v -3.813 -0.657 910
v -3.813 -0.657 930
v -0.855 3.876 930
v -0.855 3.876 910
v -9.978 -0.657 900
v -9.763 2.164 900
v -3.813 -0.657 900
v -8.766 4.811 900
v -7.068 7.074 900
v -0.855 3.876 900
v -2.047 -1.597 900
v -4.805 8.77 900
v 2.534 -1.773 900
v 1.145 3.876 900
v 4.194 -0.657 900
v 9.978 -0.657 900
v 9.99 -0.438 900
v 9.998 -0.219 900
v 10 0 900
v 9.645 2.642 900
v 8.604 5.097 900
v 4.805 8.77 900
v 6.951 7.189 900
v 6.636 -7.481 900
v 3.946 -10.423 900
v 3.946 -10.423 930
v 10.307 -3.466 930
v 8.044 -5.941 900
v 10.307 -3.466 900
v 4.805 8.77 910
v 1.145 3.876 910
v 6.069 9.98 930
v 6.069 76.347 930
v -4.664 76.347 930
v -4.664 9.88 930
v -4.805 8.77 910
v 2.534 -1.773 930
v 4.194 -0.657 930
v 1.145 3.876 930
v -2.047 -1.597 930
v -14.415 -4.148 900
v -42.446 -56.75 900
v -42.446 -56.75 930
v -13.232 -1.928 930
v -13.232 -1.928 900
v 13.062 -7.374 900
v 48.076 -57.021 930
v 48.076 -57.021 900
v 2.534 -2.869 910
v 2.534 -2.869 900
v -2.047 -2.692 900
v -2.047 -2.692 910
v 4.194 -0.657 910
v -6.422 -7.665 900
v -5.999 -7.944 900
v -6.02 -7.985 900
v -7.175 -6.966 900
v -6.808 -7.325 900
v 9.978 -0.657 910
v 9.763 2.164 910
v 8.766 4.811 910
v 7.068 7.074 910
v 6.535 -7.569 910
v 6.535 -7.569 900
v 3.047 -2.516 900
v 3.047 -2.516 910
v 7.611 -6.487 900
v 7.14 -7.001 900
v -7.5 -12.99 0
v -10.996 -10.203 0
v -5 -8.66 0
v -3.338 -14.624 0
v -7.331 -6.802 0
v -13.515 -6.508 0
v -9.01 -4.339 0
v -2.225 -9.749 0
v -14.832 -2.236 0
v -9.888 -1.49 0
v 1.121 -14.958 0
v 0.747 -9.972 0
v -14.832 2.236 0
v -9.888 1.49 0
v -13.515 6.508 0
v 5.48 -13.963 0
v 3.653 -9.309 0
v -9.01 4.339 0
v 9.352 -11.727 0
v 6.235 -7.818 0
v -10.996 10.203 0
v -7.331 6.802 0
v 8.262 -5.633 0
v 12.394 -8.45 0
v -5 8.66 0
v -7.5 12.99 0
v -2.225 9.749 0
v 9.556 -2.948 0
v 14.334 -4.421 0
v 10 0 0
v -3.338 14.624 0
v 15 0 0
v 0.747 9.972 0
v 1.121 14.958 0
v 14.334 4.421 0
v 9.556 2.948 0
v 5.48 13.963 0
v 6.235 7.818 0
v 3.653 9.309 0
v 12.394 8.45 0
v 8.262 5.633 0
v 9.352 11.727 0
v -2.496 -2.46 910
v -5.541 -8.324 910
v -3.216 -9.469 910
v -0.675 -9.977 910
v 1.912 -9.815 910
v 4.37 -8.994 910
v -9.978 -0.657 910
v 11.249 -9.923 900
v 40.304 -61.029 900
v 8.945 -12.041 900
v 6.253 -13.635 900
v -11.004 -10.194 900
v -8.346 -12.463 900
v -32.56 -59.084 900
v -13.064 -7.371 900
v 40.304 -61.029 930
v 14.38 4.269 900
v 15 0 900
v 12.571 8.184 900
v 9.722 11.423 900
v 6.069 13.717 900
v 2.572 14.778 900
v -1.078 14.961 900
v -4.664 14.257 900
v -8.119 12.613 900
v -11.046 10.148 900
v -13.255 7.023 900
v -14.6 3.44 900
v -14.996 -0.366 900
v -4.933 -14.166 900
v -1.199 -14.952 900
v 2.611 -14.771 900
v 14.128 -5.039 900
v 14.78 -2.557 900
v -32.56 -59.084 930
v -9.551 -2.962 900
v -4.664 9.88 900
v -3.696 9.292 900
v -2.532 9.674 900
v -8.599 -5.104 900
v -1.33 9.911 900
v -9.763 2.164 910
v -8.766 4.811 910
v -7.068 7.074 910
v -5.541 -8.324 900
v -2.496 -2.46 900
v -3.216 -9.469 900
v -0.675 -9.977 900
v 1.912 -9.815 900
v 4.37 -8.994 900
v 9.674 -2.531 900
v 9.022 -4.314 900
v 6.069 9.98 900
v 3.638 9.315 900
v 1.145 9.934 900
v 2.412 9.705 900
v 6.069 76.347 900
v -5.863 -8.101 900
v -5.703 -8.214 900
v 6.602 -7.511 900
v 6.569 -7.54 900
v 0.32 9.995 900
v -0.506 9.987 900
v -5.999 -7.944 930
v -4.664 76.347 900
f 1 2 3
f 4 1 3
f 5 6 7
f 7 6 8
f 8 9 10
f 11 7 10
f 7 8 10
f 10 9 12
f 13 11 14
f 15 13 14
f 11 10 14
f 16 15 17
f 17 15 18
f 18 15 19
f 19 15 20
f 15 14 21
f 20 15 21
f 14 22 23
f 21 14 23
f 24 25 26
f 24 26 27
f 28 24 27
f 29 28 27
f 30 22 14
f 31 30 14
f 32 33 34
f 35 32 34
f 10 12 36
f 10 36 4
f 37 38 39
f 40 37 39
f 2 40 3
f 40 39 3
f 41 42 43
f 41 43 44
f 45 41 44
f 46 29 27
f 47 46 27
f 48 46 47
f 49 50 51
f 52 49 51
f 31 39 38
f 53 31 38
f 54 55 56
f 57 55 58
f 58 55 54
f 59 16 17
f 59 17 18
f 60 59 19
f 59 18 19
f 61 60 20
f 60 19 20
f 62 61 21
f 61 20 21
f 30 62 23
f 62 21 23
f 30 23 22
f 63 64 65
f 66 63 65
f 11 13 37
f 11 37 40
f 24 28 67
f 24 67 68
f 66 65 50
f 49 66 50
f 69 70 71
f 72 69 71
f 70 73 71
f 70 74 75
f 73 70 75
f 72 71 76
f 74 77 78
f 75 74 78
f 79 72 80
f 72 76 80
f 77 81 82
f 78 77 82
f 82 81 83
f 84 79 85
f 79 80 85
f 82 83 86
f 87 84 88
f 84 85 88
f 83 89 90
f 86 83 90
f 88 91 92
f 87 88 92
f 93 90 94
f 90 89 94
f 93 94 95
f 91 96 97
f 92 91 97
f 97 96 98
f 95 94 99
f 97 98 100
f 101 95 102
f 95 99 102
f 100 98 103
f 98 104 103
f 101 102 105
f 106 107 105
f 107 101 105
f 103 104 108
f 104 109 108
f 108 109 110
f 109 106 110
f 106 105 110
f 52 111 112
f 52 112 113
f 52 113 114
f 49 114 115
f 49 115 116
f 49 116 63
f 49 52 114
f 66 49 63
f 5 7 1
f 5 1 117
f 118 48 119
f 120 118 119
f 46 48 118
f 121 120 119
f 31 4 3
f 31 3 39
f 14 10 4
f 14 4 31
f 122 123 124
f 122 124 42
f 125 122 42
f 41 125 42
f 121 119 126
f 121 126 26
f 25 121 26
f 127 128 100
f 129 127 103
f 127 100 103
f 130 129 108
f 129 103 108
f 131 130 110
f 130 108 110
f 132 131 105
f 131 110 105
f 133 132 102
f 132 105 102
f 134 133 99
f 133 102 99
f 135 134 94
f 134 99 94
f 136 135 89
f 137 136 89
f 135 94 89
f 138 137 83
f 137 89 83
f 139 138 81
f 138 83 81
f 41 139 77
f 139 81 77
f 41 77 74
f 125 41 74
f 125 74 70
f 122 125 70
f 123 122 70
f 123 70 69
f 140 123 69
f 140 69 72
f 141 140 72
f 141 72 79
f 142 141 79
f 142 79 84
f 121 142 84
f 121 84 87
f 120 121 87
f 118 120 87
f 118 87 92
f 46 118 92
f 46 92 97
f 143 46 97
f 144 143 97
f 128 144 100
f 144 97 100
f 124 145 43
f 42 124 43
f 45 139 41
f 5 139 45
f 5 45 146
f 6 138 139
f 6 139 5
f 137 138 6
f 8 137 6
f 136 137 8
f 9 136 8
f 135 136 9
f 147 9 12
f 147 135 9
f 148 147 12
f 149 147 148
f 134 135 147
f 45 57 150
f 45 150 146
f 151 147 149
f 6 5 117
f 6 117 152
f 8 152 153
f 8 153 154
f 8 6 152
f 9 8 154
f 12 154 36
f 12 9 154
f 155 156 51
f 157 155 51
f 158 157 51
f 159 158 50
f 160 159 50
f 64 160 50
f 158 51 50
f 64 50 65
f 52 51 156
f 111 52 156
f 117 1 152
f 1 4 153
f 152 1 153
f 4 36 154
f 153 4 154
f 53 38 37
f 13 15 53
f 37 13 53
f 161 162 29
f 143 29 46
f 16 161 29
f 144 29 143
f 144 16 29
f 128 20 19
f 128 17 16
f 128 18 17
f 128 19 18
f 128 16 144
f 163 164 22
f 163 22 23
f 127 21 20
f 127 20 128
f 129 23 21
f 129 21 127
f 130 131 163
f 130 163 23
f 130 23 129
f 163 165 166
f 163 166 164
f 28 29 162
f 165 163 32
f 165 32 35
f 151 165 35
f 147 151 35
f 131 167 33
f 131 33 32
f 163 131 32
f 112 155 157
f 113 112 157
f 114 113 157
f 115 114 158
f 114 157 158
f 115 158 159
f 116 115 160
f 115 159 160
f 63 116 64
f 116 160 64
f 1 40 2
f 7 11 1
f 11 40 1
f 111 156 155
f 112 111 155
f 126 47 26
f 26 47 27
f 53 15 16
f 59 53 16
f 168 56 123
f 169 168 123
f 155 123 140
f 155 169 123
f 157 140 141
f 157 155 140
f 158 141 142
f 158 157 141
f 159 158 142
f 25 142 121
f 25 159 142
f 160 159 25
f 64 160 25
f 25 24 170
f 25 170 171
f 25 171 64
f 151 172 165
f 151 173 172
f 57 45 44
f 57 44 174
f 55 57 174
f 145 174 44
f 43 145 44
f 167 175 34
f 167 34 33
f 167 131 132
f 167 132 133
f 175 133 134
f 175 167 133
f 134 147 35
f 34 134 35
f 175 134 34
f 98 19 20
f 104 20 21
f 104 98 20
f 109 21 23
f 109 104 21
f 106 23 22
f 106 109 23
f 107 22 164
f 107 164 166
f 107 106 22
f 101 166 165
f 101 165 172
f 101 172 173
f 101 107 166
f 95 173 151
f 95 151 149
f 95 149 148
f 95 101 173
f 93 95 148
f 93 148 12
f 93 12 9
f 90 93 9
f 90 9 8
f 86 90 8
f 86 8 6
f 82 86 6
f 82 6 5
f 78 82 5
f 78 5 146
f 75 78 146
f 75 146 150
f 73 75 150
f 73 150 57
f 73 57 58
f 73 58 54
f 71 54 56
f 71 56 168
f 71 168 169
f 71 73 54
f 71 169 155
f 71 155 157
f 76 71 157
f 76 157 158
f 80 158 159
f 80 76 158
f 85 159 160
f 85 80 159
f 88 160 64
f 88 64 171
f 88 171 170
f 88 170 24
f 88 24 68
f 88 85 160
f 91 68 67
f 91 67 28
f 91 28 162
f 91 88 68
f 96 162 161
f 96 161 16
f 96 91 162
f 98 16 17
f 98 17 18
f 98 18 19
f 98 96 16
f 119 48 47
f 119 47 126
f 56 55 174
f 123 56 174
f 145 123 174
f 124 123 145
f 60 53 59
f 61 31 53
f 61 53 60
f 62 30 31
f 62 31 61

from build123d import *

# Parameters (mm, degrees)
SKETCH1_R           = 15
SKETCH1_R_2         = 10
BOSS_EXTRUDE1_DEPTH = 900
BOSS_EXTRUDE2_DEPTH = 30
BOSS_EXTRUDE4_DEPTH = 10


with BuildPart() as part:
    # Sketch1 → Boss-Extrude1 (new body)
    with BuildSketch(Plane.XY):
        Circle(SKETCH1_R)
        Circle(SKETCH1_R_2, mode=Mode.SUBTRACT)
    extrude(amount=BOSS_EXTRUDE1_DEPTH)

    # Sketch2 → Boss-Extrude2 (add)
    with BuildSketch(Plane.XY.offset(900)):
        Polygon((-0.85478257, 3.876059116), (1.14521743, 3.876059116), (4.19376888, -0.656600178), (2.534207314, -1.772779111), (-2.047481707, -1.597158437), (-3.812517163, -0.656600178), align=None)
        Polygon((-4.663745729, 9.880160695), (-4.663745729, 76.347459395), (6.069206624, 76.347459395), (6.069206624, 9.980020324), align=None)
        Polygon((10.306591378, -3.466467261), (48.075717555, -57.020753709), (40.303795306, -61.029026621), (3.945586725, -10.423127604), align=None)
        Polygon((-5.999013415, -7.943664027), (-32.560420893, -59.083641078), (-42.445609172, -56.749852712), (-13.232089487, -1.928264015), align=None)
    extrude(amount=BOSS_EXTRUDE2_DEPTH)

    # Sketch3 → Boss-Extrude4 (add)
    with BuildSketch(Plane.XY.offset(900)):
        with BuildLine():
            Line((4.19376888, -0.656600178), (9.978420527, -0.656600178))
            ThreePointArc((9.978420527, -0.656600178), (8.766423841, 4.811425261), (4.804554447, 8.770191364))
            Line((4.804554447, 8.770191364), (1.14521743, 3.876059116))
            Line((1.14521743, 3.876059116), (4.19376888, -0.656600178))
        make_face()
        with BuildLine():
            Line((-2.495519996, -2.45978847), (-5.541424945, -8.324218256))
            ThreePointArc((-5.541424945, -8.324218256), (0.624061097, -9.980508391), (6.535201584, -7.569091112))
            Line((6.535201584, -7.569091112), (3.04691128, -2.515542521))
            Line((3.04691128, -2.515542521), (2.534207314, -2.869444387))
            Line((2.534207314, -2.869444387), (-2.047481707, -2.692493454))
            Line((-2.047481707, -2.692493454), (-2.495519996, -2.45978847))
        make_face()
        with BuildLine():
            Line((-0.85478257, 3.876059116), (-3.812517163, -0.656600178))
            Line((-3.812517163, -0.656600178), (-9.978420527, -0.656600178))
            ThreePointArc((-9.978420527, -0.656600178), (-8.766423841, 4.811425261), (-4.804554447, 8.770191364))
            Line((-4.804554447, 8.770191364), (-0.85478257, 3.876059116))
        make_face()
    extrude(amount=BOSS_EXTRUDE4_DEPTH)


solid = part.part
